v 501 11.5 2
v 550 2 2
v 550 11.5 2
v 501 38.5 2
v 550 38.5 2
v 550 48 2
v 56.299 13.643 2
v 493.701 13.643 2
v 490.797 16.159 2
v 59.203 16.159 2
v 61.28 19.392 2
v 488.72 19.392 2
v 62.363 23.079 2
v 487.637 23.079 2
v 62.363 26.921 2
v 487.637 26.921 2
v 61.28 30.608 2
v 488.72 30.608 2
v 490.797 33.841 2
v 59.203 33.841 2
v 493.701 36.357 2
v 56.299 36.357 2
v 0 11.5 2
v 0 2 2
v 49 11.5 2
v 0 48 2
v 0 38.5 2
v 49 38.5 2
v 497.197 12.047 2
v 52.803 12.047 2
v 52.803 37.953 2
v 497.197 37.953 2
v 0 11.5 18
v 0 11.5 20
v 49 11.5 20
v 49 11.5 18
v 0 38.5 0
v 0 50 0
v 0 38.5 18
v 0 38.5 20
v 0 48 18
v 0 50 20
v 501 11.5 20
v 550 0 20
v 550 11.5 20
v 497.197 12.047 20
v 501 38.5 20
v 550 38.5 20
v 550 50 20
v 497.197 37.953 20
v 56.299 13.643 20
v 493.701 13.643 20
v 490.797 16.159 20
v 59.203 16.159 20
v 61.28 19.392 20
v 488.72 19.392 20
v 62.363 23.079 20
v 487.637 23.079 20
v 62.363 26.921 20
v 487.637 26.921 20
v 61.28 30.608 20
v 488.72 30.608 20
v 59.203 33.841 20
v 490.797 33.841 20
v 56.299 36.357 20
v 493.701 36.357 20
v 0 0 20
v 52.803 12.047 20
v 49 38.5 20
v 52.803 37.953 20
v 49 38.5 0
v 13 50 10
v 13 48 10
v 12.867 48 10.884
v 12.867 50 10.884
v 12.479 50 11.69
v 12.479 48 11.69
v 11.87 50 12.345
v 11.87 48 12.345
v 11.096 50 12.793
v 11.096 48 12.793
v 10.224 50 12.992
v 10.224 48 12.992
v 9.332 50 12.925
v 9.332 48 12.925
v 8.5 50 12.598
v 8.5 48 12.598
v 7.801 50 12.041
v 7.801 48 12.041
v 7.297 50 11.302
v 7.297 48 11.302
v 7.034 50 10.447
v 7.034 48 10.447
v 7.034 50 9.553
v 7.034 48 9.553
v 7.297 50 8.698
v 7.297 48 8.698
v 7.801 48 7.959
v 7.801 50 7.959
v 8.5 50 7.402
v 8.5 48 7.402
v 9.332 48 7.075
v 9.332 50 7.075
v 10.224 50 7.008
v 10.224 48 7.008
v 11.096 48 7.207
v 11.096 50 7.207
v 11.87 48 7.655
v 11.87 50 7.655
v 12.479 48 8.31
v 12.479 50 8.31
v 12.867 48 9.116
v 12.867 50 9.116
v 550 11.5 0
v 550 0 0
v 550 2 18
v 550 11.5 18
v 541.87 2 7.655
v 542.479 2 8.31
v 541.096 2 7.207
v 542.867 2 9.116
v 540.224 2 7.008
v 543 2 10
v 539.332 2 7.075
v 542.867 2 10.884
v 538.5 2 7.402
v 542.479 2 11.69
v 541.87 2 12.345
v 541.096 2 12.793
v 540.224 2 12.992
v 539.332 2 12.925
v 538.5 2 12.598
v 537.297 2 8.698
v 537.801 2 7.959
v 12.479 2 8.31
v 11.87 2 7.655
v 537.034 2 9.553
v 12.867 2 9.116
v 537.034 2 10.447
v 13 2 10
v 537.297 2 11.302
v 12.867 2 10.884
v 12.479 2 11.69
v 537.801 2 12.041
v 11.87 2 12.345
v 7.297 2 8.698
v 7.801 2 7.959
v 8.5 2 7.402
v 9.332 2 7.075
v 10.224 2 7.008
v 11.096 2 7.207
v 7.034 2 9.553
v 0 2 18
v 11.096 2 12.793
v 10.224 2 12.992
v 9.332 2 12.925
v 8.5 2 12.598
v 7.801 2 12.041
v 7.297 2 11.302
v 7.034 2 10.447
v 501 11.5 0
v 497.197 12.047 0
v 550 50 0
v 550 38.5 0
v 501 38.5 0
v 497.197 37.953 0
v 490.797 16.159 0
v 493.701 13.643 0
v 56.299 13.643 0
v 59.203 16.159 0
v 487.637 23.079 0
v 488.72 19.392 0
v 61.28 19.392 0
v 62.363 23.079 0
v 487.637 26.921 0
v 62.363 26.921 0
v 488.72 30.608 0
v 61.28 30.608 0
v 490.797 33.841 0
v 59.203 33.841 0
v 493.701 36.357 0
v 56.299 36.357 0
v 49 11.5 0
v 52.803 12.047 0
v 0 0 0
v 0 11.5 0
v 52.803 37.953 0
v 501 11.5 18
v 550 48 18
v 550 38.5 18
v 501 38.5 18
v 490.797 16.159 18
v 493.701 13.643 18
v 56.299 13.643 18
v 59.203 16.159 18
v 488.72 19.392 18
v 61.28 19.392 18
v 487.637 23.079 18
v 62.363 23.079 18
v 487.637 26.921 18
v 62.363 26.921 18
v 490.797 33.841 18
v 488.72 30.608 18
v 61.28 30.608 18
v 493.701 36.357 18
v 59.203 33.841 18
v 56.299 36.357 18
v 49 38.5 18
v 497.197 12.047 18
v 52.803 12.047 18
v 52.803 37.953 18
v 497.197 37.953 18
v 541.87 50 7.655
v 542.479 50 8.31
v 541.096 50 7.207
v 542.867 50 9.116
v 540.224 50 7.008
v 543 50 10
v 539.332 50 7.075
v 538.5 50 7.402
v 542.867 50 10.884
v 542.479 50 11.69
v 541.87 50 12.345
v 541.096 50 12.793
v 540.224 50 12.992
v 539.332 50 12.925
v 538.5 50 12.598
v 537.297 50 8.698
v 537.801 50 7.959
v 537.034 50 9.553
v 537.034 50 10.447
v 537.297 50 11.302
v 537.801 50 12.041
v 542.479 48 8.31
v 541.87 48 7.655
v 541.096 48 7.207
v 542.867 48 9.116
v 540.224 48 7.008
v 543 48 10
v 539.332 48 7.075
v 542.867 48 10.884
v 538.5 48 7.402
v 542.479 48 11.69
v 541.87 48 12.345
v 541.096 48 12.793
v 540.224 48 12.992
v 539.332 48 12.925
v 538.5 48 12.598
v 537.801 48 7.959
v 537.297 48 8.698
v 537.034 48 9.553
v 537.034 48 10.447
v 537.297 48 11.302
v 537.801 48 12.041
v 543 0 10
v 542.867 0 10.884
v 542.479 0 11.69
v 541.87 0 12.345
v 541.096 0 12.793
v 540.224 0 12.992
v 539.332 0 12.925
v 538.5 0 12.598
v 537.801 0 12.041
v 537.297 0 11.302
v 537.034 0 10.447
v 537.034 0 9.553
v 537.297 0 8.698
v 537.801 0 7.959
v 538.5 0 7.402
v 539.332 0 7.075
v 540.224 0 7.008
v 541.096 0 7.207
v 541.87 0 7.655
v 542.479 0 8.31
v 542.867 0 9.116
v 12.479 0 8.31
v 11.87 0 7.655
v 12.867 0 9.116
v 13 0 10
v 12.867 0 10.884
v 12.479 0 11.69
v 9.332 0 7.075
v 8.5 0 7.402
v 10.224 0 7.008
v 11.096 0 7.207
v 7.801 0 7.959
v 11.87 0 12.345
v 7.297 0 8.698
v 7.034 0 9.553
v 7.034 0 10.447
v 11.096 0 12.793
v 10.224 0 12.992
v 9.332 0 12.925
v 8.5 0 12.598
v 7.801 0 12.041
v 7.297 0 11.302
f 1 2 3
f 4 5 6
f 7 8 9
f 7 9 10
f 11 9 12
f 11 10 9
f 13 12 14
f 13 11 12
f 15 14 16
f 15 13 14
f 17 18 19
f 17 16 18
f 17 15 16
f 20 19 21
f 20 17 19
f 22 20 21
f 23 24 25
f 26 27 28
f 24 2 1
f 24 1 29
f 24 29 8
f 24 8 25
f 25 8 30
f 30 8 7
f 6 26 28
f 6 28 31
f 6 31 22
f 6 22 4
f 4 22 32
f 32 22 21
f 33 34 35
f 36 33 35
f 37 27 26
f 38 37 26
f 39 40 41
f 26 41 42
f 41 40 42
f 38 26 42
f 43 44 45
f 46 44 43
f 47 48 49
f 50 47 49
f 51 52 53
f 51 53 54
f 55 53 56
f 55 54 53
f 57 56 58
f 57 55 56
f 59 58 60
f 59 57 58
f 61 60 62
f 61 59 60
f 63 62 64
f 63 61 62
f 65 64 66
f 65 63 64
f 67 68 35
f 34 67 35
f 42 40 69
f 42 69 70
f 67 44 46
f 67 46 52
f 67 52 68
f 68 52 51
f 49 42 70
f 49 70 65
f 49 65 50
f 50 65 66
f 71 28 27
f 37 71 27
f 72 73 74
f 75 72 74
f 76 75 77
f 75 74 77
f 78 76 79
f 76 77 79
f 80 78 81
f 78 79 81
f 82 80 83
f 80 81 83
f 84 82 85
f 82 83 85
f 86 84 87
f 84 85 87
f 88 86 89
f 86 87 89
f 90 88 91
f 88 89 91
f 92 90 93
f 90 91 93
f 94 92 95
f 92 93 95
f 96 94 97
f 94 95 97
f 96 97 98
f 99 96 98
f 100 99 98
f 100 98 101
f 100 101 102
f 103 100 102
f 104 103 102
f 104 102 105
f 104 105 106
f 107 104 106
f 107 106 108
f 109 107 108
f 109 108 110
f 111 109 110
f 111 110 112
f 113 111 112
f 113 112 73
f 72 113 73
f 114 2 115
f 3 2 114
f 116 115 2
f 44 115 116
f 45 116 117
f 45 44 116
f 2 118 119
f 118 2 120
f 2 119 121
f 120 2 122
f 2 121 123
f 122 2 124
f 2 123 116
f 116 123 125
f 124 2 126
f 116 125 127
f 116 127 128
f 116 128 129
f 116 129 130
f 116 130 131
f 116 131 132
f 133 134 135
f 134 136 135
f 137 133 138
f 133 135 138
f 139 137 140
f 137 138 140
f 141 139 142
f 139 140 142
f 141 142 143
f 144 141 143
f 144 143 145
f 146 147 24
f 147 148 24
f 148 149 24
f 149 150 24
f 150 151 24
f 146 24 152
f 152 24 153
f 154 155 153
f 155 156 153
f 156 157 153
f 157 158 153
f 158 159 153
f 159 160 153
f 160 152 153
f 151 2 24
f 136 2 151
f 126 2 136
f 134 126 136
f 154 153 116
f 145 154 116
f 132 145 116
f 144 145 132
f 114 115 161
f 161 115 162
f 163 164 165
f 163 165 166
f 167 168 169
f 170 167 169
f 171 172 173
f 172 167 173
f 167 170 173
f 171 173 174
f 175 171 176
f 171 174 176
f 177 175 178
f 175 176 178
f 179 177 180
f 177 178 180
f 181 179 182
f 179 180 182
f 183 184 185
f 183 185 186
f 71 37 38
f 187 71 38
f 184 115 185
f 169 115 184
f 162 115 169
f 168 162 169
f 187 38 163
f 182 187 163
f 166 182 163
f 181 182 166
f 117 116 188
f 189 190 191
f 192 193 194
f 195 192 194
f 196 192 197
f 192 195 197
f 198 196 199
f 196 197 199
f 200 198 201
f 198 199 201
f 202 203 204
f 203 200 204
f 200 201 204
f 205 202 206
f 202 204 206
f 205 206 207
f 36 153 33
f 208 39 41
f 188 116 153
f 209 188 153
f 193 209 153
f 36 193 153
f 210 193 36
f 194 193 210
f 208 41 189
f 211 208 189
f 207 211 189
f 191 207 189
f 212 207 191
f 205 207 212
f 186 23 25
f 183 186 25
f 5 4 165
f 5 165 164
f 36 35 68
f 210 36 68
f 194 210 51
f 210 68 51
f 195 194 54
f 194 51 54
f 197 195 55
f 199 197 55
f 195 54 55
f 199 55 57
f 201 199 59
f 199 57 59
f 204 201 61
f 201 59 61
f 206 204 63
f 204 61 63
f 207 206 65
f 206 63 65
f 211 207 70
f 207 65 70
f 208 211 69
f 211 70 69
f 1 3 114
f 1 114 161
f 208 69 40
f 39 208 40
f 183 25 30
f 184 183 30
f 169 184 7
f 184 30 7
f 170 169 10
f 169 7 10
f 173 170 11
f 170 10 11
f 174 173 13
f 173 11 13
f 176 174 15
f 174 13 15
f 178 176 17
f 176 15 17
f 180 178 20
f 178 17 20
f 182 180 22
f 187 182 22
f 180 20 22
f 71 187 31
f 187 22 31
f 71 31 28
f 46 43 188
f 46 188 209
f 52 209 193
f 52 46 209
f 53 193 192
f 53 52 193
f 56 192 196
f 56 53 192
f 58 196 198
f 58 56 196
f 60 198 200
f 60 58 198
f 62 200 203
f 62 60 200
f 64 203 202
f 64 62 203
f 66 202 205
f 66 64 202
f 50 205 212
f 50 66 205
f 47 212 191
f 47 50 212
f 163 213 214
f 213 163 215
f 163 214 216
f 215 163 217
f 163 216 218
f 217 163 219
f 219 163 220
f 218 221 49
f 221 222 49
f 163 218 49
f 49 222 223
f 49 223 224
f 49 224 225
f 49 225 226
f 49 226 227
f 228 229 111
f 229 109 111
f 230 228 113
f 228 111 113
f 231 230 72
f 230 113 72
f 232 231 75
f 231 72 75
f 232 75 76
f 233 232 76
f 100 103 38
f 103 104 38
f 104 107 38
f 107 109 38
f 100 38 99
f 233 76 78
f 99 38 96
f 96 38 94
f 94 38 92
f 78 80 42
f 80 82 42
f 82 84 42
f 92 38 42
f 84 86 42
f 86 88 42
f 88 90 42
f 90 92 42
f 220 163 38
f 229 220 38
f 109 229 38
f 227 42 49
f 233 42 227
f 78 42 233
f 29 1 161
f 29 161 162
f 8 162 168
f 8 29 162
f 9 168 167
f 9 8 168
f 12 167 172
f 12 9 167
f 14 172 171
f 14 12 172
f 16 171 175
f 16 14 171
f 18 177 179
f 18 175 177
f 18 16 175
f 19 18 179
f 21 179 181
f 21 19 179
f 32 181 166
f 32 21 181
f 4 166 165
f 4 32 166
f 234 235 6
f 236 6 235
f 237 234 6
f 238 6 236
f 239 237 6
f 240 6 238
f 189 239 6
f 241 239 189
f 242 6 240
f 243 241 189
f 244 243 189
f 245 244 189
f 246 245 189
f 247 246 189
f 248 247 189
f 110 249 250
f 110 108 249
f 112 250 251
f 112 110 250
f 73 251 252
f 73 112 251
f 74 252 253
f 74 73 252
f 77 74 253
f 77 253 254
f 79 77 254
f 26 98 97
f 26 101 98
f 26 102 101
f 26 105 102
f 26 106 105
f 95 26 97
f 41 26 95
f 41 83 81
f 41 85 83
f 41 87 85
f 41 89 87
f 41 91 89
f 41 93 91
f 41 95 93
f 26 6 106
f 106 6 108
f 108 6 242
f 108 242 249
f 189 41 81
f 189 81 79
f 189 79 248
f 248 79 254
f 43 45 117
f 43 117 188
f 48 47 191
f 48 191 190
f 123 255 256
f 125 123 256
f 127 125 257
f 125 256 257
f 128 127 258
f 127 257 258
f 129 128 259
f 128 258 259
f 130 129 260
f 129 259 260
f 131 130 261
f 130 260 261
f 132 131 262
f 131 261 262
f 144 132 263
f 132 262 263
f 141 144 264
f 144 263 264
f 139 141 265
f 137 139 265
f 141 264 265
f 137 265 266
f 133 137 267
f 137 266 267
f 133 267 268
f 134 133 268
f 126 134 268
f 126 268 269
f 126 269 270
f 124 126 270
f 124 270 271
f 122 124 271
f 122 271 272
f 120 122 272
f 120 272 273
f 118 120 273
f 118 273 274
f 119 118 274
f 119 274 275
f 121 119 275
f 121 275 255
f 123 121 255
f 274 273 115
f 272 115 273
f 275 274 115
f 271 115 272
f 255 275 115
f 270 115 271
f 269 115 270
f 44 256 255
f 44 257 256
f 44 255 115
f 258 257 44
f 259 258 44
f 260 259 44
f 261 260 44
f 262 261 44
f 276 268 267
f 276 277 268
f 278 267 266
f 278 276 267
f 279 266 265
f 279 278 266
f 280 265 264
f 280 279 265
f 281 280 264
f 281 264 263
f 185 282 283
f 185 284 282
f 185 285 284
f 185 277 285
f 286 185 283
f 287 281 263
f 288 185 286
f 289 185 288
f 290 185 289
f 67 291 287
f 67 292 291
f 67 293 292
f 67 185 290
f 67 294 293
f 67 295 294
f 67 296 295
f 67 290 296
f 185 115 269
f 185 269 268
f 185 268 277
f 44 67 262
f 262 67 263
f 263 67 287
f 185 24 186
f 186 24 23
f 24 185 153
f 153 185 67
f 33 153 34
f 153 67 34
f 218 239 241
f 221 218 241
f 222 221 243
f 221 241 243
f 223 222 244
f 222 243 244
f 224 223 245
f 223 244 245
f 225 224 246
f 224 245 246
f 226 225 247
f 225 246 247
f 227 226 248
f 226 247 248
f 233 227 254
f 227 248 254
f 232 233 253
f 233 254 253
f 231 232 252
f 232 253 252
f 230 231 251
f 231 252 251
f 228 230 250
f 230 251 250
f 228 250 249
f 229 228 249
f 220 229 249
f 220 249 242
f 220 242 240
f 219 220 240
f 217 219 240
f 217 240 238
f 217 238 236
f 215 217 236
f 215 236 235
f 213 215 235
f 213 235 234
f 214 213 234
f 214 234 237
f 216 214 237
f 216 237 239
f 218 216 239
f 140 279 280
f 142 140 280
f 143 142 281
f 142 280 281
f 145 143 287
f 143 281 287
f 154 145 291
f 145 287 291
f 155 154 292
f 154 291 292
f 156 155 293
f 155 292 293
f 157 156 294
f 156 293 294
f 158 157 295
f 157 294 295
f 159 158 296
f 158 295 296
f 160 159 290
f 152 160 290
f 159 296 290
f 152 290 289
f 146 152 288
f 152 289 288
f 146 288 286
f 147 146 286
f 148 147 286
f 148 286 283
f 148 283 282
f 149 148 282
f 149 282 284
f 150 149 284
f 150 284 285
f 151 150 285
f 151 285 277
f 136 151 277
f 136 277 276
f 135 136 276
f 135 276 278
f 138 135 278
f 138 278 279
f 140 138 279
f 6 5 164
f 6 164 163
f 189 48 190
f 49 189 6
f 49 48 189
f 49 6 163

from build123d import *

# Parameters (mm, degrees)
F0_W     = 50
F0_H     = 20
F0_W_2   = 46
F0_H_2   = 16
F1_DEPTH = 550
F2_R     = 3
F3_DEPTH = 50.001
F5_DEPTH = 20.001


# Not quite as in the source:
# - a pattern or mirror of a feature is missing from the dataset's text; its kind, count and spacing are read off the source's solid


with BuildPart() as f1:
    # F0 (on Right) → F1 (new body)
    with BuildSketch(Plane.YZ):
        with Locations((25, 10)):
            Rectangle(F0_W, F0_H)
        with Locations((25, 10)):
            Rectangle(F0_W_2, F0_H_2, mode=Mode.SUBTRACT)
    extrude(amount=F1_DEPTH)

    # F2 (on face) → F3 (cut, through all)
    with BuildSketch(Plane.XZ):
        with Locations((10, 10)):
            Circle(F2_R)
        with Locations((540, 10)):
            Circle(F2_R)
    extrude(amount=-F3_DEPTH, mode=Mode.SUBTRACT)

    # F4 (on face) → F5 (cut, through all)
    with BuildSketch(Plane.XY.offset(20)):
        with BuildLine():
            Line((0, 11.5), (49, 11.5))
            ThreePointArc((49, 11.5), (62.5, 25), (49, 38.5))
            Line((49, 38.5), (0, 38.5))
            Line((0, 38.5), (0, 11.5))
        make_face()
    f5 = extrude(amount=-F5_DEPTH, mode=Mode.SUBTRACT)

    # F5_copies: F5 across plane
    add(f5.mirror(Plane(origin=(275, 0, 0), x_dir=(0, 0, 1), z_dir=(1, 0, 0))), mode=Mode.SUBTRACT)


solid = f1.part
